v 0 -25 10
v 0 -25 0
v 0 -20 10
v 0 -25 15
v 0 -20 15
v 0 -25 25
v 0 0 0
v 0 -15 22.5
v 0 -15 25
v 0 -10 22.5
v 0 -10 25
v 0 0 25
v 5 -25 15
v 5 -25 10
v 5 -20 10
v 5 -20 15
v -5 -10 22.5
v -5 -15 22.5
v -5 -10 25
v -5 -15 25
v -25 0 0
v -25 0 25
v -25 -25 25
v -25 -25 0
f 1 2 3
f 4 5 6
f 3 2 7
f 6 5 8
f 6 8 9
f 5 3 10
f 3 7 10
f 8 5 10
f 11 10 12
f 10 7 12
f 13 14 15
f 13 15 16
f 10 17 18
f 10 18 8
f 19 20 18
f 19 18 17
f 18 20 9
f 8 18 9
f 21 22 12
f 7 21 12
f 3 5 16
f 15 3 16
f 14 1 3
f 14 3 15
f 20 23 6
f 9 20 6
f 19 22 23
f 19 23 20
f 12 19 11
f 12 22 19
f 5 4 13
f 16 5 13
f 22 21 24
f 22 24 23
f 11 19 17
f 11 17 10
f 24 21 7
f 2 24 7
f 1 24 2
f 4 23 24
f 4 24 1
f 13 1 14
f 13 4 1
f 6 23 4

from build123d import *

# Parameters (mm, degrees)
F0_W     = 25
F0_H     = 25
F1_DEPTH = 25
F2_W     = 5
F2_H     = 5
F4_DEPTH = 5
F3_W     = 5
F3_H     = 5
F5_DEPTH = 2.5


with BuildPart() as f1:
    # F0 (on Front) → F1 (new body)
    with BuildSketch(Plane.XZ):
        with Locations((-12.5, 12.5)):
            Rectangle(F0_W, F0_H)
    extrude(amount=F1_DEPTH)

    # F2 (on face) → F4 (join)
    with BuildSketch(Plane.XZ.offset(25)):
        with Locations((2.5, 12.5)):
            Rectangle(F2_W, F2_H)
    extrude(amount=-F4_DEPTH)

    # F3 (on face) → F5 (cut, symmetric)
    with BuildSketch(Plane.XY.offset(25)):
        with Locations((-2.5, -12.5)):
            Rectangle(F3_W, F3_H)
    extrude(amount=F5_DEPTH, both=True, mode=Mode.SUBTRACT)


solid = f1.part
